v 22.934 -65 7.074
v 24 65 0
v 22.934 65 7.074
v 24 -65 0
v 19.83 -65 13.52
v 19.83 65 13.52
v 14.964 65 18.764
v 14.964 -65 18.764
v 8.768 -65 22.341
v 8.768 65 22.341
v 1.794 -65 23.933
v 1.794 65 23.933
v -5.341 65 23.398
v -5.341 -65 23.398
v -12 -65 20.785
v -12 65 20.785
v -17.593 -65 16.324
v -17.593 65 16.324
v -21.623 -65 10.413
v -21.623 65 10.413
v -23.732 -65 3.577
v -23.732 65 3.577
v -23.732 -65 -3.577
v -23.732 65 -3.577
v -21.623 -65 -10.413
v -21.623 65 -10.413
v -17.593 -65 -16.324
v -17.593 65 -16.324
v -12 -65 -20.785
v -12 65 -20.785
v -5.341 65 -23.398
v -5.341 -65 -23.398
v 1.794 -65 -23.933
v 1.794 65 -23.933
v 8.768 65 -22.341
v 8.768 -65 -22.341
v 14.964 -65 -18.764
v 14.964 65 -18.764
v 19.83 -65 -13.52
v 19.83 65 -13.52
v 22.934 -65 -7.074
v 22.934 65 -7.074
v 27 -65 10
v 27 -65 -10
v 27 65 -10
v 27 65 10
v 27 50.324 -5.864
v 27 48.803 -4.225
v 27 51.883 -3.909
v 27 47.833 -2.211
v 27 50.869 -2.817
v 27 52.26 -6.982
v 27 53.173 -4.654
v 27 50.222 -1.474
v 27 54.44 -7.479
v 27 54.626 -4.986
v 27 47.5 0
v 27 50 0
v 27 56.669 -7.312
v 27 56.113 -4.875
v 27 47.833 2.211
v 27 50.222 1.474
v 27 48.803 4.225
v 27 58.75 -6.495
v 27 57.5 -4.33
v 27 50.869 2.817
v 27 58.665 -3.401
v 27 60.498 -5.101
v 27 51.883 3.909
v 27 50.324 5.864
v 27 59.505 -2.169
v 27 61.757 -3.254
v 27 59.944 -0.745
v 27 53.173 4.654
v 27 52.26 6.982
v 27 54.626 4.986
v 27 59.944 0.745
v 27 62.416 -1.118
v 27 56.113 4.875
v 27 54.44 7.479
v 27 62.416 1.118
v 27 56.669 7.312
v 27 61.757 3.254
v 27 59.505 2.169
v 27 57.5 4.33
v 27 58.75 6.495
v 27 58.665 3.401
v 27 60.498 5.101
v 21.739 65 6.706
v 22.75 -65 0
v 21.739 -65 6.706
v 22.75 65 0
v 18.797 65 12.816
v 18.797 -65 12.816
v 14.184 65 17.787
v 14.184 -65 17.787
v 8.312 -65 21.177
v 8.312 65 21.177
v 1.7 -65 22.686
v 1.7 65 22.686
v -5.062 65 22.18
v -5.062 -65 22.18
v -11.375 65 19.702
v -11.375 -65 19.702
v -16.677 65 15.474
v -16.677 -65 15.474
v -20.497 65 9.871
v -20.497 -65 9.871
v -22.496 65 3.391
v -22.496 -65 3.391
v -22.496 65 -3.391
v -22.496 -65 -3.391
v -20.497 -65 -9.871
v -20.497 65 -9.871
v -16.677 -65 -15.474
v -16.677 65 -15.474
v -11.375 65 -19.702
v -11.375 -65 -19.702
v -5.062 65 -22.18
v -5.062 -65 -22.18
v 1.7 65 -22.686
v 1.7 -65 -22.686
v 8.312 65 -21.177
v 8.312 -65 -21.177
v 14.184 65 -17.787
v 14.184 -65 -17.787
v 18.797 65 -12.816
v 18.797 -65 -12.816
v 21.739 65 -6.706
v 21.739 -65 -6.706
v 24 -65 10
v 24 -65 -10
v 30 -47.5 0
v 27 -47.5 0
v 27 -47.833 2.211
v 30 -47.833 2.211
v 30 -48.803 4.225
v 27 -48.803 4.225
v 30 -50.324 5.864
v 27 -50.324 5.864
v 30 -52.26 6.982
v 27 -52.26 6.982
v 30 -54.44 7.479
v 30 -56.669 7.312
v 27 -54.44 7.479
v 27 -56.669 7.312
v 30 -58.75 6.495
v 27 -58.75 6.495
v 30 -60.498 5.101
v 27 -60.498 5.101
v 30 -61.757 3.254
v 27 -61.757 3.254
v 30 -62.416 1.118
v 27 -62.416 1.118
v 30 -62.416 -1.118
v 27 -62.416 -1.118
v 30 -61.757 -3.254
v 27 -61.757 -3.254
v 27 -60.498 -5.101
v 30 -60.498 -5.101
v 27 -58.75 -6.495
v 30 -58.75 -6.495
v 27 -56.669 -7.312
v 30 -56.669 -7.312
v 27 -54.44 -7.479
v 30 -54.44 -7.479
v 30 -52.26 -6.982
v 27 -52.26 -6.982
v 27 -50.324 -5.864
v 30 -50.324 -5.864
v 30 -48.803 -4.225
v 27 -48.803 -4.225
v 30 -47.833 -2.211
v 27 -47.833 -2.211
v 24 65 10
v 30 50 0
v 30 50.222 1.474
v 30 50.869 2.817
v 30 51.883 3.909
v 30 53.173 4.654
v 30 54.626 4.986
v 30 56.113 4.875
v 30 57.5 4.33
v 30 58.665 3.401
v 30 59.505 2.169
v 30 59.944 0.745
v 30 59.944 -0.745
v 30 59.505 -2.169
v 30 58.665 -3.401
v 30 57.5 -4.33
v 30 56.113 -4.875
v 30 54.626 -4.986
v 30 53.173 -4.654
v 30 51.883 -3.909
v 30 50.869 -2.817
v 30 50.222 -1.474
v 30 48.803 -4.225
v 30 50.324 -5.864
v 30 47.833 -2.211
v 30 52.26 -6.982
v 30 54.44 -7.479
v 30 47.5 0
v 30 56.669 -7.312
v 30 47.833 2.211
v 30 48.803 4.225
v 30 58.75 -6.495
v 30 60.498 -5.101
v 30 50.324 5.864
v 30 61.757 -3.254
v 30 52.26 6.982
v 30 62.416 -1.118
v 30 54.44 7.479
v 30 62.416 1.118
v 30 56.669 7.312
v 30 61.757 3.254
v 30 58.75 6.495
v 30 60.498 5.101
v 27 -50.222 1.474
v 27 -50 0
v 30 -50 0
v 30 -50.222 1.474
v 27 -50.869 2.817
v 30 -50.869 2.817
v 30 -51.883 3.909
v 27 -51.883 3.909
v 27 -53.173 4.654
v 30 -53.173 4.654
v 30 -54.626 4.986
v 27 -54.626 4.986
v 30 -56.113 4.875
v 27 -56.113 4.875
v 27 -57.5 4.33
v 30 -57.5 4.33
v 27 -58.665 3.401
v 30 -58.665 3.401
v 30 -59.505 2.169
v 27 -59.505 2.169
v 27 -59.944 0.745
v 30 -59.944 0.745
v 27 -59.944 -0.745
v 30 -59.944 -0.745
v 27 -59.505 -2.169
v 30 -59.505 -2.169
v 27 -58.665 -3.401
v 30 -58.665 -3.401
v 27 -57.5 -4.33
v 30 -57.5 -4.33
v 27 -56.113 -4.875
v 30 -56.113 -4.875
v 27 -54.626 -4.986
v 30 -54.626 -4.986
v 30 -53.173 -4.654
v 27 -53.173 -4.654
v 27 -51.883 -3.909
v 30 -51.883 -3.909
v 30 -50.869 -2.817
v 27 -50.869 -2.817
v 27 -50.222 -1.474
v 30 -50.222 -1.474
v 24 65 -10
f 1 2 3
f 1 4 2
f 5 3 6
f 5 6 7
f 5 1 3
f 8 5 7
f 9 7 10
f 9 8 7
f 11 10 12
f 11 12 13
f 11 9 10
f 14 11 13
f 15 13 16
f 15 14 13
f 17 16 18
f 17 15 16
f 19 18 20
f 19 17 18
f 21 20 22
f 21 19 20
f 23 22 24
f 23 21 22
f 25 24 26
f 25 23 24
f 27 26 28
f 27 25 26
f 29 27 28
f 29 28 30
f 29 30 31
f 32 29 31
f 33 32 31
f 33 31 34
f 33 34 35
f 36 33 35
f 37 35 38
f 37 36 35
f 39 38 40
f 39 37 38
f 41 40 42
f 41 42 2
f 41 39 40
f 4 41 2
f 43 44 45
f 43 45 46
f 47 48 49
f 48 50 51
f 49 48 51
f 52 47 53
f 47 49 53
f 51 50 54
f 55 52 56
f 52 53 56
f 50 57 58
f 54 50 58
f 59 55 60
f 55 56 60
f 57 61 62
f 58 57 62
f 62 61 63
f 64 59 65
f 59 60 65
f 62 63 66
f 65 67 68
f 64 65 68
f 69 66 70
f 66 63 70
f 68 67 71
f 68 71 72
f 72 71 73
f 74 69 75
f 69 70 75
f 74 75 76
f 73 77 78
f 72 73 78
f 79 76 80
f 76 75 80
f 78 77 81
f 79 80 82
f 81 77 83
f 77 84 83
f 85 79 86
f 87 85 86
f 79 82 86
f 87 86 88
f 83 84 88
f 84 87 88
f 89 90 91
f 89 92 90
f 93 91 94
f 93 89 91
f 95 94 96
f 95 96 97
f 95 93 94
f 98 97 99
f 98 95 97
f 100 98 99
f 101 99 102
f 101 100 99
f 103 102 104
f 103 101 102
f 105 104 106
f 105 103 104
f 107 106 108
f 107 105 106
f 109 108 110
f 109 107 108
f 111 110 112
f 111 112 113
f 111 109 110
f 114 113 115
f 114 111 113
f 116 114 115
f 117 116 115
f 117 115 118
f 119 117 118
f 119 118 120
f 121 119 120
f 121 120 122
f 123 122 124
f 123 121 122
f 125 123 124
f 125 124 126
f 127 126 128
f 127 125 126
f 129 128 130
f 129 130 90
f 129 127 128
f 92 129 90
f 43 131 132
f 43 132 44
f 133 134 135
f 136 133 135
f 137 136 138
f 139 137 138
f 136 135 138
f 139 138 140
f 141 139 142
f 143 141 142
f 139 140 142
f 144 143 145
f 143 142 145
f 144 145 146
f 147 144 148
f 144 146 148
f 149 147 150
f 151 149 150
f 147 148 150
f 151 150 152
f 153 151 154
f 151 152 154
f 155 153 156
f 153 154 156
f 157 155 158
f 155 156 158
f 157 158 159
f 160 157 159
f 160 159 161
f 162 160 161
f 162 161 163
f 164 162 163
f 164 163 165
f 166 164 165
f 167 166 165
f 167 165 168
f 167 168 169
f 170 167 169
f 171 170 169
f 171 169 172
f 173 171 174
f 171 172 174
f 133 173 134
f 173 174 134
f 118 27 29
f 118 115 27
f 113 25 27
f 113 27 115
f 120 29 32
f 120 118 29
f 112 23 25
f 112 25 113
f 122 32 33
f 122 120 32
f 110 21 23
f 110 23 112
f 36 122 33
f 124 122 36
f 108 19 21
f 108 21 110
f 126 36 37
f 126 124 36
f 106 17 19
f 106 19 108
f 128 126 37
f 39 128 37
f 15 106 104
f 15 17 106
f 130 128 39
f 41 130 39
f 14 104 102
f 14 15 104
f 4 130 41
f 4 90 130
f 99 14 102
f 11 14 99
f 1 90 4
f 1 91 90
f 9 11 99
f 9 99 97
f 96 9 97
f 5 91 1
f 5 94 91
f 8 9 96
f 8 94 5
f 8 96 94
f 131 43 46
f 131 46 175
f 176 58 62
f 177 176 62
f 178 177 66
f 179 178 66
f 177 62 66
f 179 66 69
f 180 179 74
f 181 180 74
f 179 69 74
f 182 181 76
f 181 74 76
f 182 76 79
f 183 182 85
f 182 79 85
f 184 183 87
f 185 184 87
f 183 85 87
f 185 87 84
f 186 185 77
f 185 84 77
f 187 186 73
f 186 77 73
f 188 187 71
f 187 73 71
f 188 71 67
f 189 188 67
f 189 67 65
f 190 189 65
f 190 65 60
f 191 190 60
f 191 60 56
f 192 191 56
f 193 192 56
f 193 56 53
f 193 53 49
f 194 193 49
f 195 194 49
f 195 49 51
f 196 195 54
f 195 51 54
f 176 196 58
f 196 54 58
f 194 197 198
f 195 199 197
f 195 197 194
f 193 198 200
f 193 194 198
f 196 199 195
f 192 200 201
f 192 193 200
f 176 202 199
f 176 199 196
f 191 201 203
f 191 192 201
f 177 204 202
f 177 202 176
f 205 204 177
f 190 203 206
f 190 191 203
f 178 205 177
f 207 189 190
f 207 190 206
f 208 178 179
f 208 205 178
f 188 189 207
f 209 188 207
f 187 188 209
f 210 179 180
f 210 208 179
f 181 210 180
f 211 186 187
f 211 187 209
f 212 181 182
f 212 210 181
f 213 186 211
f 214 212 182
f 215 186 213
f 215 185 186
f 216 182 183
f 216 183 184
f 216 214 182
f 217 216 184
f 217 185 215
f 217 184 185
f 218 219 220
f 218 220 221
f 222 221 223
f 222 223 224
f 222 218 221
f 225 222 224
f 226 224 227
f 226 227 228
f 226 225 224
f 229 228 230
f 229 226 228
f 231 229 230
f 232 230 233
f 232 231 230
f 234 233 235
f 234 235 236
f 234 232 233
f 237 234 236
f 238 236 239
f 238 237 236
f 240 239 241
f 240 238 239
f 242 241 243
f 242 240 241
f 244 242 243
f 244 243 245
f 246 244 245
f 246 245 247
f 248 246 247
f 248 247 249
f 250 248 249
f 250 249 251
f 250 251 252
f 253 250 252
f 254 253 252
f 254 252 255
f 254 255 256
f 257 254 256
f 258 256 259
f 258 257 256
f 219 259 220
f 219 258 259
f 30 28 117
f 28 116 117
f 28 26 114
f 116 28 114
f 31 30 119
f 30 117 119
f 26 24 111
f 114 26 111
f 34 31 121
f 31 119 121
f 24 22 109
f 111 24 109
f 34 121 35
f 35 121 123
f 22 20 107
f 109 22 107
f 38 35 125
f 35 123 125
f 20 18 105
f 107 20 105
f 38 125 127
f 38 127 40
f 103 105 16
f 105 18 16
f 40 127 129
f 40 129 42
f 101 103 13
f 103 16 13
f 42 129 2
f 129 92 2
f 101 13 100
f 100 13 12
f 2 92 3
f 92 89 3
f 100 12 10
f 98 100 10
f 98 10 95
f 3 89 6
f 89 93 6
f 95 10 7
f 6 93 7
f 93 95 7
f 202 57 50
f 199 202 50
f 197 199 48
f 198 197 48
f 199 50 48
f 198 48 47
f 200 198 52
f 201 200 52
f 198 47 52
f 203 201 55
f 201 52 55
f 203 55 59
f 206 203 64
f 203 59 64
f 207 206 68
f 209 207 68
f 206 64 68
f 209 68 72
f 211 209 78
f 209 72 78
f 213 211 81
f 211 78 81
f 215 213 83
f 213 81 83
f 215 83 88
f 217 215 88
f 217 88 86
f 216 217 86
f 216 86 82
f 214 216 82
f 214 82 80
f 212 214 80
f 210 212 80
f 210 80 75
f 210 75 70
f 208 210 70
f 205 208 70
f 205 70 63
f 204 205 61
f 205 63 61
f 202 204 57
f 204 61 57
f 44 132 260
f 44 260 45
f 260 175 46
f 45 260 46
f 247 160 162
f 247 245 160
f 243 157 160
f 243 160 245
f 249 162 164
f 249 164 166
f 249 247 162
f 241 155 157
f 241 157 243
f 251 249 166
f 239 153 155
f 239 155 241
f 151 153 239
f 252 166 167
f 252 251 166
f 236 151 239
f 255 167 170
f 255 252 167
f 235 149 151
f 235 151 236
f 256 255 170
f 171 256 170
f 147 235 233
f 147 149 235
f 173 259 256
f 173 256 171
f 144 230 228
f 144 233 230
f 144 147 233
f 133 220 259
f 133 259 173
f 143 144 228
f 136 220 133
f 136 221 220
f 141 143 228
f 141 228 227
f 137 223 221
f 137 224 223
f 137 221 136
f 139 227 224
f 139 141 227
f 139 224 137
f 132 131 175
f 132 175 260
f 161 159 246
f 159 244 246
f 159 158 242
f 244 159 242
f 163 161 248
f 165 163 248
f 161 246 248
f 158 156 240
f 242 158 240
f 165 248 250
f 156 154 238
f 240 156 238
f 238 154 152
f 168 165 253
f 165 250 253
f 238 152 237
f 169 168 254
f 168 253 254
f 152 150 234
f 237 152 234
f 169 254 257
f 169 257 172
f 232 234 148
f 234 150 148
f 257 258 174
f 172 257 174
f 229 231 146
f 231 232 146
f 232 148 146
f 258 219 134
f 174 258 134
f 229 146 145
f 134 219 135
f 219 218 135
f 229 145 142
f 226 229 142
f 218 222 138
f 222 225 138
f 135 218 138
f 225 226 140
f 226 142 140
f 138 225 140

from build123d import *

# Parameters (mm, degrees)
F0_R     = 24
F0_R_2   = 22.75
F1_DEPTH = 65
F3_DEPTH = 130
F4_R     = 7.5
F4_R_2   = 5
F5_DEPTH = 3


with BuildPart() as f1:
    # F0 (on Front) → F1 (new body, symmetric)
    with BuildSketch(Plane.XZ):
        Circle(F0_R)
        Circle(F0_R_2, mode=Mode.SUBTRACT)
    extrude(amount=F1_DEPTH, both=True)


with BuildPart() as f3:
    # F2 (on face) → F3 (new body)
    with BuildSketch(Plane.XZ.offset(65)):
        Polygon((24, 10), (24, 0), (24, -10), (27, -10), (27, 10), align=None)
    extrude(amount=-F3_DEPTH)


with BuildPart() as f5:
    # F4 (on face) → F5 (new body)
    with BuildSketch(Plane.YZ.offset(27)):
        with Locations((-55, 0)):
            Circle(F4_R)
        with Locations((-55, 0)):
            Circle(F4_R_2, mode=Mode.SUBTRACT)
    extrude(amount=F5_DEPTH)


with BuildPart() as f5b:
    # F4 (on face) → F5, piece 2 (new body)
    with BuildSketch(Plane.YZ.offset(27)):
        with BuildLine():
            ThreePointArc((62.5, 0), (55, 7.5), (47.5, 0))
            ThreePointArc((47.5, 0), (55, -7.5), (62.5, 0))
        make_face()
        with BuildLine():
            ThreePointArc((60, 0), (55, -5), (50, 0))
            ThreePointArc((50, 0), (55, 5), (60, 0))
        make_face(mode=Mode.SUBTRACT)
    extrude(amount=F5_DEPTH)


solid = Compound([f1.part, f3.part, f5.part, f5b.part])
